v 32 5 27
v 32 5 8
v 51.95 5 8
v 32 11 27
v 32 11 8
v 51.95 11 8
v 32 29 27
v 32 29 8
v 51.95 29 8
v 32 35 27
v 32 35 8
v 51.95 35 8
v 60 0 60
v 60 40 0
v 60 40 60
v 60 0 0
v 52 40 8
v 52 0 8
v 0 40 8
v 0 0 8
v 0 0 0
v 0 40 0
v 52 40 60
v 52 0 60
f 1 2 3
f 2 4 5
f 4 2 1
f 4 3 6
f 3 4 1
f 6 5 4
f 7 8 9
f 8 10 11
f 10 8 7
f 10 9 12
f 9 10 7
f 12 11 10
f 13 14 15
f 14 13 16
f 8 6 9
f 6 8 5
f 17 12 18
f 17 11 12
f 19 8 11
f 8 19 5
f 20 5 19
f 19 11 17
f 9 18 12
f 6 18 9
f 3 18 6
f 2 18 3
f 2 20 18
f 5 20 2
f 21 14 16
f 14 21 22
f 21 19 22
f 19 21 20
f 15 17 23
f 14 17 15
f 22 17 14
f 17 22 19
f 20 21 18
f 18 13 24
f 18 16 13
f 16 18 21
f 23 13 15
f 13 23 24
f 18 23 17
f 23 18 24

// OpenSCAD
$fn = 32;

// ----------------------------------------------------------------------
// Rib bracket: 2-gusset L bracket
// ----------------------------------------------------------------------

// --- parameters (mm) ---
base_l = 60;              // foot length, X
base_w = 40;              // foot width, Y
base_t = 8;               // foot thickness
plate_t = 8;              // upright plate thickness
plate_h = 60;             // overall height
gus_l = 20;               // gusset leg along the foot
gus_h = 20;               // gusset height
gus_t = 6;                // gusset thickness
gus_edge = 5;             // gusset margin from the foot edge
n_gus = 2;                // gusset count

gus_pitch = (base_w - 2 * gus_edge - gus_t) / (n_gus - 1);  // gusset pitch

union() {
  cube([base_l, base_w, base_t]);
  translate([base_l - plate_t, 0, base_t - 1])
    cube([plate_t, base_w, plate_h - base_t + 1]);
  for (i = [0 : n_gus - 1])
    translate([base_l - plate_t - gus_l, gus_edge + i * gus_pitch, base_t - 1])
      rotate([-90, 0, 0])
        linear_extrude(height = gus_t)
          polygon(points = [[0, 0], [gus_l + 1, 0], [0, -gus_h]]);
}
